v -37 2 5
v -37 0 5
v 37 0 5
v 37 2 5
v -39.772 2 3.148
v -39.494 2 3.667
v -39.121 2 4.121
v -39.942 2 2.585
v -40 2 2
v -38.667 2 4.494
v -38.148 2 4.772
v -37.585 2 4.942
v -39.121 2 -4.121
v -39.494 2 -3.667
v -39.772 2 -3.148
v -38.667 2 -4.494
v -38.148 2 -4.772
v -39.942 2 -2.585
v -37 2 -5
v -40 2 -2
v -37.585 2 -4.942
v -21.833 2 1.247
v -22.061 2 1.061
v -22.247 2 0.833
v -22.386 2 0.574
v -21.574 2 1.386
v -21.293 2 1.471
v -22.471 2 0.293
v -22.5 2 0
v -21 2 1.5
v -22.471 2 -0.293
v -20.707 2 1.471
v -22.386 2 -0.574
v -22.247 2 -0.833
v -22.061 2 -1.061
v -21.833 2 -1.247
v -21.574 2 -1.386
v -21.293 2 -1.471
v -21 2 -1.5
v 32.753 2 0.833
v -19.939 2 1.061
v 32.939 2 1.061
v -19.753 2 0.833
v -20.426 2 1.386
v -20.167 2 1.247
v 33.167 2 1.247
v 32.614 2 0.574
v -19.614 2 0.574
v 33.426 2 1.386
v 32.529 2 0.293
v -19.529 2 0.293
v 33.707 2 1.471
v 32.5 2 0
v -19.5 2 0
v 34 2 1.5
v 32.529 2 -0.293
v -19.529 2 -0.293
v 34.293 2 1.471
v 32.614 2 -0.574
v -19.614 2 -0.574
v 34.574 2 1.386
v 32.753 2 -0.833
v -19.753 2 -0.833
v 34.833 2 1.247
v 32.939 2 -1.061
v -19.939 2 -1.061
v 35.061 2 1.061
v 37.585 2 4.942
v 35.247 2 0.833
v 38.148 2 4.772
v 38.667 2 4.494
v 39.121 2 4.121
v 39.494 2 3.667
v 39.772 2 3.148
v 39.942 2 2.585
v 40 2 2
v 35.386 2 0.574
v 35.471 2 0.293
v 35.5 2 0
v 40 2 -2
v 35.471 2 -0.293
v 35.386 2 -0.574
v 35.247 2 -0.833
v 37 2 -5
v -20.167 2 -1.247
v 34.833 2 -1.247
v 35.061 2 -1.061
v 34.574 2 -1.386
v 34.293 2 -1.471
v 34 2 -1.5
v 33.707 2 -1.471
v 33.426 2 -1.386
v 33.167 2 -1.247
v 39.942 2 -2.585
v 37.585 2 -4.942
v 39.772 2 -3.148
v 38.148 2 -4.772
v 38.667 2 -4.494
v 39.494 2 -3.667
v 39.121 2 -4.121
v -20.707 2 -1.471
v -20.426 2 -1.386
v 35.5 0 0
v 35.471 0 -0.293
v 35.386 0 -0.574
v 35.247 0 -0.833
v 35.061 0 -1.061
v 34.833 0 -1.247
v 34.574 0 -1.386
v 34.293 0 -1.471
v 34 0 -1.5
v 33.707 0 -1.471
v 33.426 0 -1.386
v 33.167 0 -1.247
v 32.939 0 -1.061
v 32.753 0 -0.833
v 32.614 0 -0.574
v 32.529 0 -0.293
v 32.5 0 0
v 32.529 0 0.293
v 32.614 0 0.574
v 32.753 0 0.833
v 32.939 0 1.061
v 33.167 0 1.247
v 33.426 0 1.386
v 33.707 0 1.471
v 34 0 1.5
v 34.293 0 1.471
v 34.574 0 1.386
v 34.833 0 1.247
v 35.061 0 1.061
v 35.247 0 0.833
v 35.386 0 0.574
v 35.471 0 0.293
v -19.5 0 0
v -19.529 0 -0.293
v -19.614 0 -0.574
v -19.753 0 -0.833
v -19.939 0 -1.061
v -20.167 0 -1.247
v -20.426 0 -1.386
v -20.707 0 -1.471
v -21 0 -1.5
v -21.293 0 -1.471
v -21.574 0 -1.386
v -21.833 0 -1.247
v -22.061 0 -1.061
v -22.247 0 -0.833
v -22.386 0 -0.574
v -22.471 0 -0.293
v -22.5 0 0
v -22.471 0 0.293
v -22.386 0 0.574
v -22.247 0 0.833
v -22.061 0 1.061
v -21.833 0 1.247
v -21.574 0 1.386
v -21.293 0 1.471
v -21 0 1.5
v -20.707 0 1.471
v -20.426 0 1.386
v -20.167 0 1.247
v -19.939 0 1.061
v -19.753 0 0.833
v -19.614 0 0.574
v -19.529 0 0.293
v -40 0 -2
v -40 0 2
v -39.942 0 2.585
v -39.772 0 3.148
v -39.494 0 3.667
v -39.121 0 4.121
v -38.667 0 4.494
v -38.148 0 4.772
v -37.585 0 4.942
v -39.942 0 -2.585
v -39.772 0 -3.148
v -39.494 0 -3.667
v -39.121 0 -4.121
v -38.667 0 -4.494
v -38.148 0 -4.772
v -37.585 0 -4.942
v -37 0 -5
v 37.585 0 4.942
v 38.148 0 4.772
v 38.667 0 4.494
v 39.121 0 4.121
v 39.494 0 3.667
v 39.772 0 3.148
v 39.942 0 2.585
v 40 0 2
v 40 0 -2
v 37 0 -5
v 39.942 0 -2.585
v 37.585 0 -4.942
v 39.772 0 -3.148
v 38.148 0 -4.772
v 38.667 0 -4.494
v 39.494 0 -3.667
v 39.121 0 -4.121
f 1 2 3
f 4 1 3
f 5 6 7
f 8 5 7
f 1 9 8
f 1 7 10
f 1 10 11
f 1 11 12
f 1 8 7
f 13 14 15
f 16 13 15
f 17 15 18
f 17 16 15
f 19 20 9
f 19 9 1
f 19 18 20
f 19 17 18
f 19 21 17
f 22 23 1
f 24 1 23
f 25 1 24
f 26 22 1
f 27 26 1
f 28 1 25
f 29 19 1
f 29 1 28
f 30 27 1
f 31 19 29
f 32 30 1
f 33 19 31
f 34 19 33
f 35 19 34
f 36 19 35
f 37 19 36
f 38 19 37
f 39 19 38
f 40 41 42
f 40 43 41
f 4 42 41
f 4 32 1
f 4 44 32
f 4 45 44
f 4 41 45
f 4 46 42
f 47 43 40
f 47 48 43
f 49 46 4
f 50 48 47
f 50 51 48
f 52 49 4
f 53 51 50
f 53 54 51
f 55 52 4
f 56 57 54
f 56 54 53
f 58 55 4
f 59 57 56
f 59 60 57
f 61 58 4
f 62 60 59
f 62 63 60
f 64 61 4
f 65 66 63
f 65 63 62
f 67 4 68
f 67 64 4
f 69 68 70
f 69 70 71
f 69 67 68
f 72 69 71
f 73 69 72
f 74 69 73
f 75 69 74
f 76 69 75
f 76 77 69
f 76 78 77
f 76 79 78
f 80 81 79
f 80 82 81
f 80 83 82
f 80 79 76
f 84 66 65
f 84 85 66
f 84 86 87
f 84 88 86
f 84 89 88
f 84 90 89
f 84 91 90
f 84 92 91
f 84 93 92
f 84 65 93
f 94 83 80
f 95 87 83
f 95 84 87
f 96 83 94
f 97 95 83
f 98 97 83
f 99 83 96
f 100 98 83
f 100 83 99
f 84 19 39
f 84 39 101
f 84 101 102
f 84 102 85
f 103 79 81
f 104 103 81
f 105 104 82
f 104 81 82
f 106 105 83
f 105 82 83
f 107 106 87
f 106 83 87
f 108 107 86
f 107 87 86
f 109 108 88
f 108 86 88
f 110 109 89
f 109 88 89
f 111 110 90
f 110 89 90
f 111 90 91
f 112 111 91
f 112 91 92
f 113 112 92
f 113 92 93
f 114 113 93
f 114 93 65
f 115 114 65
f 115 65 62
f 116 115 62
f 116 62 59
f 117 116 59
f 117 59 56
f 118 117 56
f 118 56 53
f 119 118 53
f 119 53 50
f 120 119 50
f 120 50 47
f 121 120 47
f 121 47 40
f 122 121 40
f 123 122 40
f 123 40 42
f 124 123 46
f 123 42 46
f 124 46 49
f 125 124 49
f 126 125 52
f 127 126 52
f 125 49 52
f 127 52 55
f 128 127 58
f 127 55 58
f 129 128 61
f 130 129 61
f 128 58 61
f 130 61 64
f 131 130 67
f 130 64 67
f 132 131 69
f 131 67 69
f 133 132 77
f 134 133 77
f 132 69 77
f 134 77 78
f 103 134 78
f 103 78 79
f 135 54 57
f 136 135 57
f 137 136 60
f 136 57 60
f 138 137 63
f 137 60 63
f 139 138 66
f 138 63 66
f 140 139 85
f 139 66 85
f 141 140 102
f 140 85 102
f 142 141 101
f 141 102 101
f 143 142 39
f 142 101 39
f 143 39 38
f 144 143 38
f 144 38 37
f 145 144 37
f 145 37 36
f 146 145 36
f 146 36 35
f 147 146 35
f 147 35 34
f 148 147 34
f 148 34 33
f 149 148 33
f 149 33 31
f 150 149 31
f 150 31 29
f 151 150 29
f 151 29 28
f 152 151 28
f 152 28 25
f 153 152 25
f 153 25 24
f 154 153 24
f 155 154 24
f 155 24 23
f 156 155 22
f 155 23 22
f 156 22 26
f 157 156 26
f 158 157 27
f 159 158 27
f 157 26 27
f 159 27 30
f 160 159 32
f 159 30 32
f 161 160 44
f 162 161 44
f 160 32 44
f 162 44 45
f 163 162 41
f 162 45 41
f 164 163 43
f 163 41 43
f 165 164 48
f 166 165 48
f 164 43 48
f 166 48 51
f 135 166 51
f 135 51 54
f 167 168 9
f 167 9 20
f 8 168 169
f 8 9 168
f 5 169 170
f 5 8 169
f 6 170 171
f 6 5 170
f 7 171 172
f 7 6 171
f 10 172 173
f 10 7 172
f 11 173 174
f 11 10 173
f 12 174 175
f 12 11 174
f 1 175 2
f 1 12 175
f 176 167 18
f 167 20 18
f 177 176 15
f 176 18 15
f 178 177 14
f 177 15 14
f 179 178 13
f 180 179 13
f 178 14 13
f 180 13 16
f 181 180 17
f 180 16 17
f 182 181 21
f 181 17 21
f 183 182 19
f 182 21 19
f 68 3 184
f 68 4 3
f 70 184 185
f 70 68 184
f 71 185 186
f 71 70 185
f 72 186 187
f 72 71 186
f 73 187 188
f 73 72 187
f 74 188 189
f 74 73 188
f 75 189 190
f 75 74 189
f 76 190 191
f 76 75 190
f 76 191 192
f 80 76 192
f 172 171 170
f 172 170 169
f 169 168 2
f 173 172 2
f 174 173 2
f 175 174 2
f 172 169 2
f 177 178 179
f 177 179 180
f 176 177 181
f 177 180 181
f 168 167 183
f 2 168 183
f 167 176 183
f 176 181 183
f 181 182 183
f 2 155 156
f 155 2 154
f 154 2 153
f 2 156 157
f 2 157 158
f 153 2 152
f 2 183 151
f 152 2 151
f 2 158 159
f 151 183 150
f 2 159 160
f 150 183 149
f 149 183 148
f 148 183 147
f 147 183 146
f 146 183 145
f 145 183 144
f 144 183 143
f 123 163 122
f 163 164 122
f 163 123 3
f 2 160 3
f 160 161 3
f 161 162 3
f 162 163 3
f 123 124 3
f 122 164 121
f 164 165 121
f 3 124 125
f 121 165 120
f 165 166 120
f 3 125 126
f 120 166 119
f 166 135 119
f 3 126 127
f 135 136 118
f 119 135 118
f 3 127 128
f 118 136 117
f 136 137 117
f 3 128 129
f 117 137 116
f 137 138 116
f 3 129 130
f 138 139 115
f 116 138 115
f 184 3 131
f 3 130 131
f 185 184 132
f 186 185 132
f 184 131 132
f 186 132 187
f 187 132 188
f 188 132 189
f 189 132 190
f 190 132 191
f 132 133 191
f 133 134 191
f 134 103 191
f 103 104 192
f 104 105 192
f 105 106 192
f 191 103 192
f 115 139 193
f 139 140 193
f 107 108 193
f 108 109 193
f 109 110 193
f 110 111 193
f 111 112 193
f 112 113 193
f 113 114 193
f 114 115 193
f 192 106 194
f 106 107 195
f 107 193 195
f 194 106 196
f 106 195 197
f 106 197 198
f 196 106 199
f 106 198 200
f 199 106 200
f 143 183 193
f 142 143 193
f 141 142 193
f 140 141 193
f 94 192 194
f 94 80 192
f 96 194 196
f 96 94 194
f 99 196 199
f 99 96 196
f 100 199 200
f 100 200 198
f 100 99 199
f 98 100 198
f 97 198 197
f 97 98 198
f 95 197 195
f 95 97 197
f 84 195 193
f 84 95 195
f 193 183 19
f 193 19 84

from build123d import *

# Parameters (mm, degrees)
SKETCH1_W             = 80
SKETCH1_H             = 10
BOSS_EXTRUDE1_DEPTH   = 2
FILLET1_R             = 3
F_3_0MM_DOWEL_HOLE1_D = 3


with BuildPart() as part:
    # Sketch1 → Boss-Extrude1 (new body)
    with BuildSketch(Plane(origin=(0, 0, 0), x_dir=(1, 0, 0), z_dir=(0, 1, 0))):
        Rectangle(SKETCH1_W, SKETCH1_H)
    extrude(amount=BOSS_EXTRUDE1_DEPTH)

    # Fillet1
    fillet1_edges = [part.edges().sort_by_distance(p)[0] for p in [
        (40, 1, 5),
        (-40, 1, 5),
        (-40, 1, -5),
        (40, 1, -5),
    ]]
    fillet(fillet1_edges, radius=FILLET1_R)

    # Ø3.0mm Dowel Hole1 (through all)
    with Locations(Plane(origin=(0, 0, 0), x_dir=(-1, 0, 0), z_dir=(0, -1, 0))):
        with Locations((-34, 0), (21, 0)):
            Hole(F_3_0MM_DOWEL_HOLE1_D / 2)


solid = part.part
